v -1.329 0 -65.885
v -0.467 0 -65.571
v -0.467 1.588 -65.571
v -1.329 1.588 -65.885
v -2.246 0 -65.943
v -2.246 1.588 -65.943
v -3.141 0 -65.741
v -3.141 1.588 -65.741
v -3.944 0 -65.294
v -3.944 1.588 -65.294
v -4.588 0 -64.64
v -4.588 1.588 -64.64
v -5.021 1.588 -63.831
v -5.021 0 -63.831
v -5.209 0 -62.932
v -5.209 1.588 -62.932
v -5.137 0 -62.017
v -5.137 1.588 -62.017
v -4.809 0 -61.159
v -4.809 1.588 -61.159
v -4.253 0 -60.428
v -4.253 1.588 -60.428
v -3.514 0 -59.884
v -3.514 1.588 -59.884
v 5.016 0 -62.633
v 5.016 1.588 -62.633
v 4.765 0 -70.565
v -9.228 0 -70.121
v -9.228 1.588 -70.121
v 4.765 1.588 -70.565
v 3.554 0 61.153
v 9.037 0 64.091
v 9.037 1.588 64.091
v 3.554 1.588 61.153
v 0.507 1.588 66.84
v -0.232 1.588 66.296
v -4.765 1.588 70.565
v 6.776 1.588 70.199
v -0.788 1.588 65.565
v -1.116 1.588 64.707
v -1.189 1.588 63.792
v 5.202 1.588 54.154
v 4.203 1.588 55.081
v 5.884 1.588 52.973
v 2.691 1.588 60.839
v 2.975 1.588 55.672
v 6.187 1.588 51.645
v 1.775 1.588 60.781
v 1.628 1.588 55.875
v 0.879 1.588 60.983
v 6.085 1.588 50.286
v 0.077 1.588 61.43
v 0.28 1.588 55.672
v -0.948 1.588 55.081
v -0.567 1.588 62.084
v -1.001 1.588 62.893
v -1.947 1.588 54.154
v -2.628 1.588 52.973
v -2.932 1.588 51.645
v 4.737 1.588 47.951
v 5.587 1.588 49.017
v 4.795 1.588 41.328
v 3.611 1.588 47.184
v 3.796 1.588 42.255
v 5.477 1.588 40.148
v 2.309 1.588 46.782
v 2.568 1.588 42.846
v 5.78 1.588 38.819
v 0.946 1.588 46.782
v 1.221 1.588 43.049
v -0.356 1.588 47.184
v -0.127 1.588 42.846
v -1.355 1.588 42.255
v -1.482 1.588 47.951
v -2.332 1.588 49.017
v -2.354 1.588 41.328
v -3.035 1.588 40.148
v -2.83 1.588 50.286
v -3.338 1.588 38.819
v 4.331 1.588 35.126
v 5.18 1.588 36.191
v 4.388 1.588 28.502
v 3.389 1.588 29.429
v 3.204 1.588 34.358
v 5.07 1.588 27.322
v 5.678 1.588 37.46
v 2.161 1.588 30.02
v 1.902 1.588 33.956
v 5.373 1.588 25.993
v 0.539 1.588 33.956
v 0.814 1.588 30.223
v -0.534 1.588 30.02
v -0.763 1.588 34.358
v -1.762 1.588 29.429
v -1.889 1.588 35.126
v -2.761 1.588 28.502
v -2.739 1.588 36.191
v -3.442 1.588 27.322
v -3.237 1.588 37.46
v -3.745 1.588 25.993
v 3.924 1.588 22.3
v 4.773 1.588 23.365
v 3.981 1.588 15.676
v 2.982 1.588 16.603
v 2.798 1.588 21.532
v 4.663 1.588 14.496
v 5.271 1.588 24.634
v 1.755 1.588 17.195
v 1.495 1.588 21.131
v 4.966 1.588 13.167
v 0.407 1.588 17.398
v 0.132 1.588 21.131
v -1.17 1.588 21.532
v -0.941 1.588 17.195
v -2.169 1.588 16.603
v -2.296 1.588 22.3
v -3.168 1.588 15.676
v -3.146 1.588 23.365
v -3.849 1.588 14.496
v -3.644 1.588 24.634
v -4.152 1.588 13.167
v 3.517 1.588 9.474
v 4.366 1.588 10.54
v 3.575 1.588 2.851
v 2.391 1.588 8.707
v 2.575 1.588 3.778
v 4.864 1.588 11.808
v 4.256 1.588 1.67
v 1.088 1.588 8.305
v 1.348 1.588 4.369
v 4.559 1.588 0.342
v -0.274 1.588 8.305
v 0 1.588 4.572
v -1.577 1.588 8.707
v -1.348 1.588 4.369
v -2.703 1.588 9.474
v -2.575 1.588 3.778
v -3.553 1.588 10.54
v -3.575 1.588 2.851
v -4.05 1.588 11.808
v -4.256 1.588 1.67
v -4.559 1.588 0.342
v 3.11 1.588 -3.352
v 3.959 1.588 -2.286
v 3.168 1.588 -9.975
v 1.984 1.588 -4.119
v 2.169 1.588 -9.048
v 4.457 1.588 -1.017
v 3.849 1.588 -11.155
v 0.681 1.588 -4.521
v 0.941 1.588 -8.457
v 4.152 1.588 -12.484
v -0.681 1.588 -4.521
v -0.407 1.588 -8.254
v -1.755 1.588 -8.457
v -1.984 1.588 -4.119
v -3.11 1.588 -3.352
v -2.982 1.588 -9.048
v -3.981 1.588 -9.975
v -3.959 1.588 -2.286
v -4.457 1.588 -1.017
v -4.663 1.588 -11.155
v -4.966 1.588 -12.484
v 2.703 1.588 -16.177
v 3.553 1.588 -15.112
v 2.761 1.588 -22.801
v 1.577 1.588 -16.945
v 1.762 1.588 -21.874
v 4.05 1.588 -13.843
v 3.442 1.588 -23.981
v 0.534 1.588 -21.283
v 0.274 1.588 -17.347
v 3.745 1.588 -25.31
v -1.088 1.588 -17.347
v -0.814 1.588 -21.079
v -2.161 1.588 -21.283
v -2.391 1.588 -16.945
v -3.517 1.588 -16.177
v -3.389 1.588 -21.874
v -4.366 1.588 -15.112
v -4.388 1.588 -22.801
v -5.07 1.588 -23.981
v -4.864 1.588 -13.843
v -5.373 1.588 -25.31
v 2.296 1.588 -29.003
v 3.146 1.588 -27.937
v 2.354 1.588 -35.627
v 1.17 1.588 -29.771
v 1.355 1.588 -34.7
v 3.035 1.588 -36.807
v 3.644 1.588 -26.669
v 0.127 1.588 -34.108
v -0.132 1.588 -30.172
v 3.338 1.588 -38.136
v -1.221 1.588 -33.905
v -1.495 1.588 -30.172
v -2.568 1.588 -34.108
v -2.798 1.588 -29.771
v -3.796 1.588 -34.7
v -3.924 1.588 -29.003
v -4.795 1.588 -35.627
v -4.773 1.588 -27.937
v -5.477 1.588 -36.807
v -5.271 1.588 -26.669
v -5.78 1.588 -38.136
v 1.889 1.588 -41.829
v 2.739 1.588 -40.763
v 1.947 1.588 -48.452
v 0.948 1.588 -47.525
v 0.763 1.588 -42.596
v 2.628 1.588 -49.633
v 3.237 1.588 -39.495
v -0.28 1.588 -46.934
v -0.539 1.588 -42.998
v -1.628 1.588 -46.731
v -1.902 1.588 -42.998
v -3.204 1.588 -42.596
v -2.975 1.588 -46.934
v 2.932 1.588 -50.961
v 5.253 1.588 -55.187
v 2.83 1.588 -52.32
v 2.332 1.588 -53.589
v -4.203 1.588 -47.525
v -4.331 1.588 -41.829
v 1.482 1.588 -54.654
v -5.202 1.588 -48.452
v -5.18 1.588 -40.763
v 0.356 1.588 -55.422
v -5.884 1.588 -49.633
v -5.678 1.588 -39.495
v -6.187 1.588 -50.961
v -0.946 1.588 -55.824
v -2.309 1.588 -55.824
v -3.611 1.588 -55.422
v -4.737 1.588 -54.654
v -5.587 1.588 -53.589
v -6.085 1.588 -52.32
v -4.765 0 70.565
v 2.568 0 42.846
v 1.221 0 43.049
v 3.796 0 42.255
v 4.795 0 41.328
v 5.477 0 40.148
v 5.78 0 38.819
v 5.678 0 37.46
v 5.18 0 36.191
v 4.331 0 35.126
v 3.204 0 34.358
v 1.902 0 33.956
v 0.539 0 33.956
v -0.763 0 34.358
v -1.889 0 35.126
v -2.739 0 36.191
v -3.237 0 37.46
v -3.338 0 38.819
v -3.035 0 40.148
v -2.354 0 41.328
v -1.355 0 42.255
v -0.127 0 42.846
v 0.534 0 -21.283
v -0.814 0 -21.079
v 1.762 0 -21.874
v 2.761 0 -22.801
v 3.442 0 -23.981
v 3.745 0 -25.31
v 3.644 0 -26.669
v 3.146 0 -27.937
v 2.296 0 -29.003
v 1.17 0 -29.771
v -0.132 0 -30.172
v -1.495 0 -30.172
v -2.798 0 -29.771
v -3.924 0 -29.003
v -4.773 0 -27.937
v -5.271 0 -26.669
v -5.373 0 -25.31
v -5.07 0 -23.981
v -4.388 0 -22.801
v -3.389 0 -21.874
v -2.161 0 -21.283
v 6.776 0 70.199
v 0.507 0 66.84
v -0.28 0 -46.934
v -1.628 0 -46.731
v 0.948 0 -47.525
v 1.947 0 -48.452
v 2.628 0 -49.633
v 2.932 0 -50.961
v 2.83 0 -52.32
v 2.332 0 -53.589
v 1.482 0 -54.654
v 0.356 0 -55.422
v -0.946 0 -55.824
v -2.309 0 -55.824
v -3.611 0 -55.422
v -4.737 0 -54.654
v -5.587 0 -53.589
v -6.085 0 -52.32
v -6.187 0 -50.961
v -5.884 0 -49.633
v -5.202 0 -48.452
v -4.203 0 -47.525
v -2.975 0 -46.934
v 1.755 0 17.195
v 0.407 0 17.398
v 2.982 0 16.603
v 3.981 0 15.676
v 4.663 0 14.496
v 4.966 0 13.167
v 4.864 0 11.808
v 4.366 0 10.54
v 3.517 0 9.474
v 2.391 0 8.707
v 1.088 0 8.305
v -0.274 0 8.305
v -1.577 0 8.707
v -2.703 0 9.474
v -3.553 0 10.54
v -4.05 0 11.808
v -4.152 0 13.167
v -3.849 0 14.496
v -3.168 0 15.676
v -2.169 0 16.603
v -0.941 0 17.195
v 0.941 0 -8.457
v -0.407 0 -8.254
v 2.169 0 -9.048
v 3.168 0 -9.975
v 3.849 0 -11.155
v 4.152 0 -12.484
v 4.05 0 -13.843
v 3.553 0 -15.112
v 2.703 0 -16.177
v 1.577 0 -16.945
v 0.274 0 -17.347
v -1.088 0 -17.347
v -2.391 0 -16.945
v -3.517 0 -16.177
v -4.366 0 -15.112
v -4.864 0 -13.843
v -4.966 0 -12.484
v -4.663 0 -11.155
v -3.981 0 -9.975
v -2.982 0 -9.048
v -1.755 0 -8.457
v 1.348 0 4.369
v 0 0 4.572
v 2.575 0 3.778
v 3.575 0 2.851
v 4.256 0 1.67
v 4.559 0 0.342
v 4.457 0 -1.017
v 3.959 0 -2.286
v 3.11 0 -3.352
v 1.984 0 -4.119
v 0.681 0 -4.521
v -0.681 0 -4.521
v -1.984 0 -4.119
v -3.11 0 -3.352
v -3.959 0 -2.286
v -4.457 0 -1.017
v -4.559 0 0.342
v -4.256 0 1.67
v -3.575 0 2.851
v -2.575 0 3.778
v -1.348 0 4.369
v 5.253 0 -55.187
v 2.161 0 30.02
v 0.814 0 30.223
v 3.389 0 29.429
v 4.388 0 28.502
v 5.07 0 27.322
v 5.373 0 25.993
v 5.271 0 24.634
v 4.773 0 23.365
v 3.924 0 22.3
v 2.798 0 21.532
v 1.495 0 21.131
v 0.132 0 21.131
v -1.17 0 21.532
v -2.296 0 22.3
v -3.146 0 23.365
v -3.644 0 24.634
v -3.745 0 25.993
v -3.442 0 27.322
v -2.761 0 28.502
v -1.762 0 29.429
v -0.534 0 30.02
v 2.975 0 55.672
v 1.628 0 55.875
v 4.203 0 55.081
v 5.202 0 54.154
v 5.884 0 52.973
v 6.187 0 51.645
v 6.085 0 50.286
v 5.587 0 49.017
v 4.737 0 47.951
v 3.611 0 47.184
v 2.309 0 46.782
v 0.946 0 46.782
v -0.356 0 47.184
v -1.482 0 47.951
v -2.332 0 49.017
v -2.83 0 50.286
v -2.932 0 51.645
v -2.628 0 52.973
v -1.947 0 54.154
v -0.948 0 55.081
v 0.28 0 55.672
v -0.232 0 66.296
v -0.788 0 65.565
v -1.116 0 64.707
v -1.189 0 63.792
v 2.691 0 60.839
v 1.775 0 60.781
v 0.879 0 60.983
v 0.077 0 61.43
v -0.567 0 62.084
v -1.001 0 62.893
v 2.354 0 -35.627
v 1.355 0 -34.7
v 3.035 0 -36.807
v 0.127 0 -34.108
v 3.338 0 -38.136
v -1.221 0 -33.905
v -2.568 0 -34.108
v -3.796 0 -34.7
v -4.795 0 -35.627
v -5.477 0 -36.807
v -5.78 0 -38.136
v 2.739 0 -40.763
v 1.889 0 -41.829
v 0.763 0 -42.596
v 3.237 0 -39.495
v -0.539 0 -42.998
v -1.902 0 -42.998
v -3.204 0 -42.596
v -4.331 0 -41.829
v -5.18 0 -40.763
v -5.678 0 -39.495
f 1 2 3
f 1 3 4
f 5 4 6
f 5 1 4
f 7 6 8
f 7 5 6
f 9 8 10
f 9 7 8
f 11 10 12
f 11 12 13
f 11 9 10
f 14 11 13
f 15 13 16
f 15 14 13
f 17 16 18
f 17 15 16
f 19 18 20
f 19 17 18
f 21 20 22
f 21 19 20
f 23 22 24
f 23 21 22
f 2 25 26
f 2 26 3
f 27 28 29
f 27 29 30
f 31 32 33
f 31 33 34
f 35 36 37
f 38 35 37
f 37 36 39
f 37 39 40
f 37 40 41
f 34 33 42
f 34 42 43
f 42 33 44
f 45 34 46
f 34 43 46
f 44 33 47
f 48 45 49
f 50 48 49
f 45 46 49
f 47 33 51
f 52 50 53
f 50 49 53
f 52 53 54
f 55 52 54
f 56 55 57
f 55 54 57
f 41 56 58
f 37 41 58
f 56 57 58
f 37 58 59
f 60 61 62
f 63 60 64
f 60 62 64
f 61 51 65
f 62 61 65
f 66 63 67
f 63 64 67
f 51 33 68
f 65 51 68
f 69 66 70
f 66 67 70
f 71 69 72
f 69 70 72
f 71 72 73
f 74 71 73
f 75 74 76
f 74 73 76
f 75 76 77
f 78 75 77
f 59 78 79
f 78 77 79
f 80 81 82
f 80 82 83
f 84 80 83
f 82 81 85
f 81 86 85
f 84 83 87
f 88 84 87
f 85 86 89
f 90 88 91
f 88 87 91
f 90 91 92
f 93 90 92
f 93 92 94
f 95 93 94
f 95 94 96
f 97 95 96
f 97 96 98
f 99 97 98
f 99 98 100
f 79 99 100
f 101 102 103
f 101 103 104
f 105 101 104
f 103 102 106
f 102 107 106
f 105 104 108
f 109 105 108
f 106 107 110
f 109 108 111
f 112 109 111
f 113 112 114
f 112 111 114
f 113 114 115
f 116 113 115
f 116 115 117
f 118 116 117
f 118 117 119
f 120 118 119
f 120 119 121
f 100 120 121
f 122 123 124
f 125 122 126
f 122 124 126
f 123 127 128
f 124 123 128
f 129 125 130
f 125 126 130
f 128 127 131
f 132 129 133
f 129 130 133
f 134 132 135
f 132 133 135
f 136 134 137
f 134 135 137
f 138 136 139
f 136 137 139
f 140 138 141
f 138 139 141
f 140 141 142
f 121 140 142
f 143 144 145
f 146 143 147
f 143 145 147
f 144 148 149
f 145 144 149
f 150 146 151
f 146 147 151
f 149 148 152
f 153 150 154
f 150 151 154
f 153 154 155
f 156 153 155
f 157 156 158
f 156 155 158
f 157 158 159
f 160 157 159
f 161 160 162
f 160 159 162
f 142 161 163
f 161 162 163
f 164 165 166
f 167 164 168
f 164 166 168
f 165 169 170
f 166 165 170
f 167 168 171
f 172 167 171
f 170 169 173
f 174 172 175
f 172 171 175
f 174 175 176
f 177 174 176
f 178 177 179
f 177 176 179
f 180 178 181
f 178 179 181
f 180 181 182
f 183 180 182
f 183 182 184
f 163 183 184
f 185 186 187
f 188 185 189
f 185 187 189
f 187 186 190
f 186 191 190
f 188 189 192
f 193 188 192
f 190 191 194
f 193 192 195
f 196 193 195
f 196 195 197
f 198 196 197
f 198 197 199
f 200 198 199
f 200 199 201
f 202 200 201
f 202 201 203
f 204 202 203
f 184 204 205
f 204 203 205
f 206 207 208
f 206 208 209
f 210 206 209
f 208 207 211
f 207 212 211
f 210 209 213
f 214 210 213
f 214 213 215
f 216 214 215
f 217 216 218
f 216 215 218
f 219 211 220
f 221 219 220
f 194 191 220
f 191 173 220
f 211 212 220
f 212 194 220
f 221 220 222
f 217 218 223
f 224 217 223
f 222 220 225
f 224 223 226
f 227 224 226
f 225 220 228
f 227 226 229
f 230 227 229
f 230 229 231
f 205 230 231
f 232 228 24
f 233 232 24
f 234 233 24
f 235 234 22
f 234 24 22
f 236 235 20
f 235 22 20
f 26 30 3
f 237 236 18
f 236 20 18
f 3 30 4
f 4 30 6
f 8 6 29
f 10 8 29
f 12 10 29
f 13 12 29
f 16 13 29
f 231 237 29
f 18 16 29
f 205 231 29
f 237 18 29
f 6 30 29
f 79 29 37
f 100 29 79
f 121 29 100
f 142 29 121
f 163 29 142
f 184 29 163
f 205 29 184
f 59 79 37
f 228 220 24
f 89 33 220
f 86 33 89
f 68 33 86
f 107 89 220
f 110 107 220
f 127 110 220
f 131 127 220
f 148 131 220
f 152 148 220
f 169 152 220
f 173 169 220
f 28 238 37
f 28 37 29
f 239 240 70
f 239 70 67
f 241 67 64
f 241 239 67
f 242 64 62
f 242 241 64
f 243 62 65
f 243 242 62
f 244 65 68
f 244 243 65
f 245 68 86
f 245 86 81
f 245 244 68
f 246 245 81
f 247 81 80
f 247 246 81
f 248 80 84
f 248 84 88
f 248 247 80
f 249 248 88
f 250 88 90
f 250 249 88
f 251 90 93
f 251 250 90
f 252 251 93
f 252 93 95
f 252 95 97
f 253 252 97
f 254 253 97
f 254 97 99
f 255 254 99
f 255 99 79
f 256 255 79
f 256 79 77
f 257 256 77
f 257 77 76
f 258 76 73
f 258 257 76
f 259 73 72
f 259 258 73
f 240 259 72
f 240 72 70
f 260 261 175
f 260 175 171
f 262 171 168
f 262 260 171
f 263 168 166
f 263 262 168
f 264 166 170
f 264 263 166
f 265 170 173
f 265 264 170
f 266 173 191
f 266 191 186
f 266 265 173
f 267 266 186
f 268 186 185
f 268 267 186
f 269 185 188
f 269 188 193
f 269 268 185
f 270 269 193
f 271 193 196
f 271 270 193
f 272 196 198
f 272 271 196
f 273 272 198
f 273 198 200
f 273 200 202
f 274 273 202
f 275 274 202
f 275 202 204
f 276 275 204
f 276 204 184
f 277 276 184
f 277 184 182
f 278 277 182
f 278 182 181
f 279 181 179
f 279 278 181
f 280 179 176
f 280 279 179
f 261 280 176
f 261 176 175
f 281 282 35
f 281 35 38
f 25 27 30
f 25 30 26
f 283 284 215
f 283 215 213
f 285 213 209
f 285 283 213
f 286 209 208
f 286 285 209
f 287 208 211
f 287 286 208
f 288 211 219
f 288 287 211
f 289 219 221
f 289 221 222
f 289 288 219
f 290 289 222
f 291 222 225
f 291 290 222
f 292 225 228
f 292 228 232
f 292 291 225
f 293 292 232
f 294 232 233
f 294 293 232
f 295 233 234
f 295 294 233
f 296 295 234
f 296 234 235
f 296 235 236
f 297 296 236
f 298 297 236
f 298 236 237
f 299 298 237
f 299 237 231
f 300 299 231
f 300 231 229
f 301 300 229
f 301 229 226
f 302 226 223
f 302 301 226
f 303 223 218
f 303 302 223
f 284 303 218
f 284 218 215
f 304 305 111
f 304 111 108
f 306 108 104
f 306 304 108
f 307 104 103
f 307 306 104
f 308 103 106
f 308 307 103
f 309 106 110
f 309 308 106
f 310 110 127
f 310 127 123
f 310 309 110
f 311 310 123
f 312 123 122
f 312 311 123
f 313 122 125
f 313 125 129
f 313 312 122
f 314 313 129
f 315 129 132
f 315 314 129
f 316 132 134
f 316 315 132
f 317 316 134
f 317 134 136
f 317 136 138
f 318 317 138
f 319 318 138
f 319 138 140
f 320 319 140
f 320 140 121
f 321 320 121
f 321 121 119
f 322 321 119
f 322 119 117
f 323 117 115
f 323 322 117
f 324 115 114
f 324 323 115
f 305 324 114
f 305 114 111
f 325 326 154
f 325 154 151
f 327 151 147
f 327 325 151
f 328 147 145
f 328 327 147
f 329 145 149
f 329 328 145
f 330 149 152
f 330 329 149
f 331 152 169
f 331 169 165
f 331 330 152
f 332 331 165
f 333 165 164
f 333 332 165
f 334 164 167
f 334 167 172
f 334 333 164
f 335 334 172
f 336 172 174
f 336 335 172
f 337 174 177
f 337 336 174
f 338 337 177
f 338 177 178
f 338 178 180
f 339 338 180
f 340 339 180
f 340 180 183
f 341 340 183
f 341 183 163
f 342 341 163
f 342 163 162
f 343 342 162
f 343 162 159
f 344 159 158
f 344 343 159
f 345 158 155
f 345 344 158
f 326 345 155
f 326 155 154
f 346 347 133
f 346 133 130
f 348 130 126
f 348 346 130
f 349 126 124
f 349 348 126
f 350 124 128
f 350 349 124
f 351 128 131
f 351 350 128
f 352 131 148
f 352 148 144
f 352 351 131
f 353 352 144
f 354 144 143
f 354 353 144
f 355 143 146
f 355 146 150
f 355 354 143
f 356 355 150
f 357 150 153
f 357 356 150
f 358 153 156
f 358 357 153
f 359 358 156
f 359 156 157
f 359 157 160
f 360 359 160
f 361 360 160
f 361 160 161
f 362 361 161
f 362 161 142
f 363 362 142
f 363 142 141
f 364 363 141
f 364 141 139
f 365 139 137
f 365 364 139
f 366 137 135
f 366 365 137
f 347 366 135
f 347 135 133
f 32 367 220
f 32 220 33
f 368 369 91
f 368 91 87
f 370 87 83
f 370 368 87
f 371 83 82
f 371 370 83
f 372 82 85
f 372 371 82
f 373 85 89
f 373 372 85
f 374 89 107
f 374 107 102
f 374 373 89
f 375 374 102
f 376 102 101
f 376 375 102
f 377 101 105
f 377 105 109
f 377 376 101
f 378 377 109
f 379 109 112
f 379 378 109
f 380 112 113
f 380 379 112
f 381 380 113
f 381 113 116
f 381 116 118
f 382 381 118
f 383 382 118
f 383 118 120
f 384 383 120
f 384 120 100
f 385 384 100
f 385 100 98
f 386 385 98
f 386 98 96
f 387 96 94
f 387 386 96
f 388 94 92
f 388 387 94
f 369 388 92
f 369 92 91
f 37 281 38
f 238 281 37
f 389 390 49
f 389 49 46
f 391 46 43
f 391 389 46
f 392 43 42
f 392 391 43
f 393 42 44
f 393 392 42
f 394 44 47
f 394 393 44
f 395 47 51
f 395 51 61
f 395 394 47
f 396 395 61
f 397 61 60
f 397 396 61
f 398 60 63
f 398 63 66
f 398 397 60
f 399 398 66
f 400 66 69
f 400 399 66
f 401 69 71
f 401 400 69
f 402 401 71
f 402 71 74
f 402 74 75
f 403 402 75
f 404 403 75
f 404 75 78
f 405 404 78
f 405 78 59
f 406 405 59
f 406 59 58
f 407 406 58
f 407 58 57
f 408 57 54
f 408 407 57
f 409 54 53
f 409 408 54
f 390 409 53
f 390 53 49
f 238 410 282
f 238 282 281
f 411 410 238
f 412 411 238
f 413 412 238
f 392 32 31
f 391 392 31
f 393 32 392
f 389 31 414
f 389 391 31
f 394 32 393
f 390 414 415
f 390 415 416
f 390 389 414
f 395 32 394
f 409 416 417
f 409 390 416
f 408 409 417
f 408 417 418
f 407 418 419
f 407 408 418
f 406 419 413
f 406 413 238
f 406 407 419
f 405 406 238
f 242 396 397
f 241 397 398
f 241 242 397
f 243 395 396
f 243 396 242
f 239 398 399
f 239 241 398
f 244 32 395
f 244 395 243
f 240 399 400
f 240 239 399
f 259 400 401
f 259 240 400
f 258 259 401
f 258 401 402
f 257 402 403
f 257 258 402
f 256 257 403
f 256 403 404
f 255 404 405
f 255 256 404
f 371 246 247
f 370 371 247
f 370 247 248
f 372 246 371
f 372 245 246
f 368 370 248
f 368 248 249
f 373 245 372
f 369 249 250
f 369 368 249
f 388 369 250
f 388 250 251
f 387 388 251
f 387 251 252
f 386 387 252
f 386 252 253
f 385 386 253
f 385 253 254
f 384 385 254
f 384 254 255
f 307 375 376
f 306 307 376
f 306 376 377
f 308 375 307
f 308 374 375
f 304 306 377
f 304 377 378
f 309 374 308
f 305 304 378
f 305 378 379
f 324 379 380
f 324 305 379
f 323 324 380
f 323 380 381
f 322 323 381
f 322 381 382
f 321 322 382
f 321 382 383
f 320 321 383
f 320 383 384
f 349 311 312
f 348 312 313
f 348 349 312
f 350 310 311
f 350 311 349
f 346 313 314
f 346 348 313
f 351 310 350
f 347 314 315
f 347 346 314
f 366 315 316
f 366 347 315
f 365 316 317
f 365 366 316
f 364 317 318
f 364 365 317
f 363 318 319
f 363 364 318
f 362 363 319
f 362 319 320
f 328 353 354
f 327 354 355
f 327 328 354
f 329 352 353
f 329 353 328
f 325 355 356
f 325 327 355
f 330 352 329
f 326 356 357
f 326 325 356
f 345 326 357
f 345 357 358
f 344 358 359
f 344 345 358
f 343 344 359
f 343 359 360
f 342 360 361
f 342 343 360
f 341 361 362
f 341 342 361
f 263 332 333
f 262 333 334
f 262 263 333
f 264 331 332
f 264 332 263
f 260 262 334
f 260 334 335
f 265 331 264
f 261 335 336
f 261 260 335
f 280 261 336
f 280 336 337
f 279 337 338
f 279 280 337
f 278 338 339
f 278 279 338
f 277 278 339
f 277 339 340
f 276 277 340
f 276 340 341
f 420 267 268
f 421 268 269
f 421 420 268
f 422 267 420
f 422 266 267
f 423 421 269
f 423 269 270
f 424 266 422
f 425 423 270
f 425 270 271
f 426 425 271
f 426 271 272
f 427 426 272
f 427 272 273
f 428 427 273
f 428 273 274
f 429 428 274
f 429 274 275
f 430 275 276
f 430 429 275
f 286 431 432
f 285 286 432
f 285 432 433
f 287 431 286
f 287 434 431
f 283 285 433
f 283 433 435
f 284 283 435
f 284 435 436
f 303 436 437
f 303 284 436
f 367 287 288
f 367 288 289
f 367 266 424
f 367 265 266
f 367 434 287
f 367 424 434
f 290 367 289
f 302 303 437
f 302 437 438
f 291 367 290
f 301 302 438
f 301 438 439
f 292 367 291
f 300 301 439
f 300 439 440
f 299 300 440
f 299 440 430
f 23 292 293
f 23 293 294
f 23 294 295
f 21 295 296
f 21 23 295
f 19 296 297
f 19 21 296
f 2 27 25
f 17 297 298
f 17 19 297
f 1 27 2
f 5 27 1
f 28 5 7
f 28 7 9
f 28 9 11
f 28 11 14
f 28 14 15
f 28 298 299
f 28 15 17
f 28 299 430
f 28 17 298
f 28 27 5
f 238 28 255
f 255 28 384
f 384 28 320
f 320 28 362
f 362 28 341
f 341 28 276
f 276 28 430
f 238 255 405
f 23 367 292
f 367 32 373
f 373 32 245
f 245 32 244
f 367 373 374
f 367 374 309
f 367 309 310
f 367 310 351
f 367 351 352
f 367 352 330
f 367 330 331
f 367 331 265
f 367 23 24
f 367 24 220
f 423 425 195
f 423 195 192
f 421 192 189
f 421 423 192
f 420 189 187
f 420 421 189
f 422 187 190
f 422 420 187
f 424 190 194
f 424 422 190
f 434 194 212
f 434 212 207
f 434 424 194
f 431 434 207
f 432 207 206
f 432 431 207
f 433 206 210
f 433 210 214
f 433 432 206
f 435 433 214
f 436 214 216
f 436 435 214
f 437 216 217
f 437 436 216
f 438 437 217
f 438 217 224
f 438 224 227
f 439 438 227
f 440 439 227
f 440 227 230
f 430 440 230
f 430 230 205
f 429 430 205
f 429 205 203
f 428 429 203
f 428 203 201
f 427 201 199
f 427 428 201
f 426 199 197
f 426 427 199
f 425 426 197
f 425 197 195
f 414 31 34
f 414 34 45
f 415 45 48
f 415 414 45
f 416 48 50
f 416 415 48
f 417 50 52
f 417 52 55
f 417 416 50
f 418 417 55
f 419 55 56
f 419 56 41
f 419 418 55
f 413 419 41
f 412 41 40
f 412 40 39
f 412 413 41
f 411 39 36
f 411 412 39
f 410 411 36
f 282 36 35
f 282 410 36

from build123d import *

# Parameters (mm, degrees)
SKETCH1_R           = 4.572
BOSS_EXTRUDE1_DEPTH = 1.5875


with BuildPart() as part:
    # Sketch1 → Boss-Extrude1 (new body)
    with BuildSketch(Plane(origin=(0, 0, 0), x_dir=(1, 0, 0), z_dir=(0, 1, 0))):
        with BuildLine():
            Line((6.776434369, -70.199185368), (-4.764680988, -70.565352679))
            Line((-4.764680988, -70.565352679), (-9.22827802, 70.121395226))
            Line((-9.22827802, 70.121395226), (4.764680988, 70.565352679))
            Line((4.764680988, 70.565352679), (5.016361067, 62.63272534))
            Line((5.016361067, 62.63272534), (-0.466659313, 65.570573089))
            ThreePointArc((-0.466659313, 65.570573089), (-4.833525642, 64.250705768), (-3.51365832, 59.883839439))
            Line((-3.51365832, 59.883839439), (5.252599263, 55.186805992))
            Line((5.252599263, 55.186805992), (9.036951983, -64.09104847))
            Line((9.036951983, -64.09104847), (3.553931604, -61.153200721))
            ThreePointArc((3.553931604, -61.153200721), (-0.812934725, -62.473068042), (0.506932596, -66.839934371))
            Line((0.506932596, -66.839934371), (6.776434369, -70.199185368))
        make_face()
        with Locations(Location((-1.627699267, 51.302954732, 0), (0, 0, 270))):
            Circle(SKETCH1_R, mode=Mode.SUBTRACT)
        with Locations(Location((-1.22077445, 38.477216049, 0), (0, 0, 270))):
            Circle(SKETCH1_R, mode=Mode.SUBTRACT)
        with Locations(Location((-0.813849634, 25.651477366, 0), (0, 0, 270))):
            Circle(SKETCH1_R, mode=Mode.SUBTRACT)
        with Locations(Location((-0.406924817, 12.825738683, 0), (0, 0, 270))):
            Circle(SKETCH1_R, mode=Mode.SUBTRACT)
        with Locations(Location((0, 0, 0), (0, 0, 270))):
            Circle(SKETCH1_R, mode=Mode.SUBTRACT)
        with Locations(Location((0.406924817, -12.825738683, 0), (0, 0, 270))):
            Circle(SKETCH1_R, mode=Mode.SUBTRACT)
        with Locations(Location((0.813849634, -25.651477366, 0), (0, 0, 270))):
            Circle(SKETCH1_R, mode=Mode.SUBTRACT)
        with Locations(Location((1.22077445, -38.477216049, 0), (0, 0, 270))):
            Circle(SKETCH1_R, mode=Mode.SUBTRACT)
        with Locations(Location((1.627699267, -51.302954732, 0), (0, 0, 270))):
            Circle(SKETCH1_R, mode=Mode.SUBTRACT)
    extrude(amount=BOSS_EXTRUDE1_DEPTH)


solid = part.part
